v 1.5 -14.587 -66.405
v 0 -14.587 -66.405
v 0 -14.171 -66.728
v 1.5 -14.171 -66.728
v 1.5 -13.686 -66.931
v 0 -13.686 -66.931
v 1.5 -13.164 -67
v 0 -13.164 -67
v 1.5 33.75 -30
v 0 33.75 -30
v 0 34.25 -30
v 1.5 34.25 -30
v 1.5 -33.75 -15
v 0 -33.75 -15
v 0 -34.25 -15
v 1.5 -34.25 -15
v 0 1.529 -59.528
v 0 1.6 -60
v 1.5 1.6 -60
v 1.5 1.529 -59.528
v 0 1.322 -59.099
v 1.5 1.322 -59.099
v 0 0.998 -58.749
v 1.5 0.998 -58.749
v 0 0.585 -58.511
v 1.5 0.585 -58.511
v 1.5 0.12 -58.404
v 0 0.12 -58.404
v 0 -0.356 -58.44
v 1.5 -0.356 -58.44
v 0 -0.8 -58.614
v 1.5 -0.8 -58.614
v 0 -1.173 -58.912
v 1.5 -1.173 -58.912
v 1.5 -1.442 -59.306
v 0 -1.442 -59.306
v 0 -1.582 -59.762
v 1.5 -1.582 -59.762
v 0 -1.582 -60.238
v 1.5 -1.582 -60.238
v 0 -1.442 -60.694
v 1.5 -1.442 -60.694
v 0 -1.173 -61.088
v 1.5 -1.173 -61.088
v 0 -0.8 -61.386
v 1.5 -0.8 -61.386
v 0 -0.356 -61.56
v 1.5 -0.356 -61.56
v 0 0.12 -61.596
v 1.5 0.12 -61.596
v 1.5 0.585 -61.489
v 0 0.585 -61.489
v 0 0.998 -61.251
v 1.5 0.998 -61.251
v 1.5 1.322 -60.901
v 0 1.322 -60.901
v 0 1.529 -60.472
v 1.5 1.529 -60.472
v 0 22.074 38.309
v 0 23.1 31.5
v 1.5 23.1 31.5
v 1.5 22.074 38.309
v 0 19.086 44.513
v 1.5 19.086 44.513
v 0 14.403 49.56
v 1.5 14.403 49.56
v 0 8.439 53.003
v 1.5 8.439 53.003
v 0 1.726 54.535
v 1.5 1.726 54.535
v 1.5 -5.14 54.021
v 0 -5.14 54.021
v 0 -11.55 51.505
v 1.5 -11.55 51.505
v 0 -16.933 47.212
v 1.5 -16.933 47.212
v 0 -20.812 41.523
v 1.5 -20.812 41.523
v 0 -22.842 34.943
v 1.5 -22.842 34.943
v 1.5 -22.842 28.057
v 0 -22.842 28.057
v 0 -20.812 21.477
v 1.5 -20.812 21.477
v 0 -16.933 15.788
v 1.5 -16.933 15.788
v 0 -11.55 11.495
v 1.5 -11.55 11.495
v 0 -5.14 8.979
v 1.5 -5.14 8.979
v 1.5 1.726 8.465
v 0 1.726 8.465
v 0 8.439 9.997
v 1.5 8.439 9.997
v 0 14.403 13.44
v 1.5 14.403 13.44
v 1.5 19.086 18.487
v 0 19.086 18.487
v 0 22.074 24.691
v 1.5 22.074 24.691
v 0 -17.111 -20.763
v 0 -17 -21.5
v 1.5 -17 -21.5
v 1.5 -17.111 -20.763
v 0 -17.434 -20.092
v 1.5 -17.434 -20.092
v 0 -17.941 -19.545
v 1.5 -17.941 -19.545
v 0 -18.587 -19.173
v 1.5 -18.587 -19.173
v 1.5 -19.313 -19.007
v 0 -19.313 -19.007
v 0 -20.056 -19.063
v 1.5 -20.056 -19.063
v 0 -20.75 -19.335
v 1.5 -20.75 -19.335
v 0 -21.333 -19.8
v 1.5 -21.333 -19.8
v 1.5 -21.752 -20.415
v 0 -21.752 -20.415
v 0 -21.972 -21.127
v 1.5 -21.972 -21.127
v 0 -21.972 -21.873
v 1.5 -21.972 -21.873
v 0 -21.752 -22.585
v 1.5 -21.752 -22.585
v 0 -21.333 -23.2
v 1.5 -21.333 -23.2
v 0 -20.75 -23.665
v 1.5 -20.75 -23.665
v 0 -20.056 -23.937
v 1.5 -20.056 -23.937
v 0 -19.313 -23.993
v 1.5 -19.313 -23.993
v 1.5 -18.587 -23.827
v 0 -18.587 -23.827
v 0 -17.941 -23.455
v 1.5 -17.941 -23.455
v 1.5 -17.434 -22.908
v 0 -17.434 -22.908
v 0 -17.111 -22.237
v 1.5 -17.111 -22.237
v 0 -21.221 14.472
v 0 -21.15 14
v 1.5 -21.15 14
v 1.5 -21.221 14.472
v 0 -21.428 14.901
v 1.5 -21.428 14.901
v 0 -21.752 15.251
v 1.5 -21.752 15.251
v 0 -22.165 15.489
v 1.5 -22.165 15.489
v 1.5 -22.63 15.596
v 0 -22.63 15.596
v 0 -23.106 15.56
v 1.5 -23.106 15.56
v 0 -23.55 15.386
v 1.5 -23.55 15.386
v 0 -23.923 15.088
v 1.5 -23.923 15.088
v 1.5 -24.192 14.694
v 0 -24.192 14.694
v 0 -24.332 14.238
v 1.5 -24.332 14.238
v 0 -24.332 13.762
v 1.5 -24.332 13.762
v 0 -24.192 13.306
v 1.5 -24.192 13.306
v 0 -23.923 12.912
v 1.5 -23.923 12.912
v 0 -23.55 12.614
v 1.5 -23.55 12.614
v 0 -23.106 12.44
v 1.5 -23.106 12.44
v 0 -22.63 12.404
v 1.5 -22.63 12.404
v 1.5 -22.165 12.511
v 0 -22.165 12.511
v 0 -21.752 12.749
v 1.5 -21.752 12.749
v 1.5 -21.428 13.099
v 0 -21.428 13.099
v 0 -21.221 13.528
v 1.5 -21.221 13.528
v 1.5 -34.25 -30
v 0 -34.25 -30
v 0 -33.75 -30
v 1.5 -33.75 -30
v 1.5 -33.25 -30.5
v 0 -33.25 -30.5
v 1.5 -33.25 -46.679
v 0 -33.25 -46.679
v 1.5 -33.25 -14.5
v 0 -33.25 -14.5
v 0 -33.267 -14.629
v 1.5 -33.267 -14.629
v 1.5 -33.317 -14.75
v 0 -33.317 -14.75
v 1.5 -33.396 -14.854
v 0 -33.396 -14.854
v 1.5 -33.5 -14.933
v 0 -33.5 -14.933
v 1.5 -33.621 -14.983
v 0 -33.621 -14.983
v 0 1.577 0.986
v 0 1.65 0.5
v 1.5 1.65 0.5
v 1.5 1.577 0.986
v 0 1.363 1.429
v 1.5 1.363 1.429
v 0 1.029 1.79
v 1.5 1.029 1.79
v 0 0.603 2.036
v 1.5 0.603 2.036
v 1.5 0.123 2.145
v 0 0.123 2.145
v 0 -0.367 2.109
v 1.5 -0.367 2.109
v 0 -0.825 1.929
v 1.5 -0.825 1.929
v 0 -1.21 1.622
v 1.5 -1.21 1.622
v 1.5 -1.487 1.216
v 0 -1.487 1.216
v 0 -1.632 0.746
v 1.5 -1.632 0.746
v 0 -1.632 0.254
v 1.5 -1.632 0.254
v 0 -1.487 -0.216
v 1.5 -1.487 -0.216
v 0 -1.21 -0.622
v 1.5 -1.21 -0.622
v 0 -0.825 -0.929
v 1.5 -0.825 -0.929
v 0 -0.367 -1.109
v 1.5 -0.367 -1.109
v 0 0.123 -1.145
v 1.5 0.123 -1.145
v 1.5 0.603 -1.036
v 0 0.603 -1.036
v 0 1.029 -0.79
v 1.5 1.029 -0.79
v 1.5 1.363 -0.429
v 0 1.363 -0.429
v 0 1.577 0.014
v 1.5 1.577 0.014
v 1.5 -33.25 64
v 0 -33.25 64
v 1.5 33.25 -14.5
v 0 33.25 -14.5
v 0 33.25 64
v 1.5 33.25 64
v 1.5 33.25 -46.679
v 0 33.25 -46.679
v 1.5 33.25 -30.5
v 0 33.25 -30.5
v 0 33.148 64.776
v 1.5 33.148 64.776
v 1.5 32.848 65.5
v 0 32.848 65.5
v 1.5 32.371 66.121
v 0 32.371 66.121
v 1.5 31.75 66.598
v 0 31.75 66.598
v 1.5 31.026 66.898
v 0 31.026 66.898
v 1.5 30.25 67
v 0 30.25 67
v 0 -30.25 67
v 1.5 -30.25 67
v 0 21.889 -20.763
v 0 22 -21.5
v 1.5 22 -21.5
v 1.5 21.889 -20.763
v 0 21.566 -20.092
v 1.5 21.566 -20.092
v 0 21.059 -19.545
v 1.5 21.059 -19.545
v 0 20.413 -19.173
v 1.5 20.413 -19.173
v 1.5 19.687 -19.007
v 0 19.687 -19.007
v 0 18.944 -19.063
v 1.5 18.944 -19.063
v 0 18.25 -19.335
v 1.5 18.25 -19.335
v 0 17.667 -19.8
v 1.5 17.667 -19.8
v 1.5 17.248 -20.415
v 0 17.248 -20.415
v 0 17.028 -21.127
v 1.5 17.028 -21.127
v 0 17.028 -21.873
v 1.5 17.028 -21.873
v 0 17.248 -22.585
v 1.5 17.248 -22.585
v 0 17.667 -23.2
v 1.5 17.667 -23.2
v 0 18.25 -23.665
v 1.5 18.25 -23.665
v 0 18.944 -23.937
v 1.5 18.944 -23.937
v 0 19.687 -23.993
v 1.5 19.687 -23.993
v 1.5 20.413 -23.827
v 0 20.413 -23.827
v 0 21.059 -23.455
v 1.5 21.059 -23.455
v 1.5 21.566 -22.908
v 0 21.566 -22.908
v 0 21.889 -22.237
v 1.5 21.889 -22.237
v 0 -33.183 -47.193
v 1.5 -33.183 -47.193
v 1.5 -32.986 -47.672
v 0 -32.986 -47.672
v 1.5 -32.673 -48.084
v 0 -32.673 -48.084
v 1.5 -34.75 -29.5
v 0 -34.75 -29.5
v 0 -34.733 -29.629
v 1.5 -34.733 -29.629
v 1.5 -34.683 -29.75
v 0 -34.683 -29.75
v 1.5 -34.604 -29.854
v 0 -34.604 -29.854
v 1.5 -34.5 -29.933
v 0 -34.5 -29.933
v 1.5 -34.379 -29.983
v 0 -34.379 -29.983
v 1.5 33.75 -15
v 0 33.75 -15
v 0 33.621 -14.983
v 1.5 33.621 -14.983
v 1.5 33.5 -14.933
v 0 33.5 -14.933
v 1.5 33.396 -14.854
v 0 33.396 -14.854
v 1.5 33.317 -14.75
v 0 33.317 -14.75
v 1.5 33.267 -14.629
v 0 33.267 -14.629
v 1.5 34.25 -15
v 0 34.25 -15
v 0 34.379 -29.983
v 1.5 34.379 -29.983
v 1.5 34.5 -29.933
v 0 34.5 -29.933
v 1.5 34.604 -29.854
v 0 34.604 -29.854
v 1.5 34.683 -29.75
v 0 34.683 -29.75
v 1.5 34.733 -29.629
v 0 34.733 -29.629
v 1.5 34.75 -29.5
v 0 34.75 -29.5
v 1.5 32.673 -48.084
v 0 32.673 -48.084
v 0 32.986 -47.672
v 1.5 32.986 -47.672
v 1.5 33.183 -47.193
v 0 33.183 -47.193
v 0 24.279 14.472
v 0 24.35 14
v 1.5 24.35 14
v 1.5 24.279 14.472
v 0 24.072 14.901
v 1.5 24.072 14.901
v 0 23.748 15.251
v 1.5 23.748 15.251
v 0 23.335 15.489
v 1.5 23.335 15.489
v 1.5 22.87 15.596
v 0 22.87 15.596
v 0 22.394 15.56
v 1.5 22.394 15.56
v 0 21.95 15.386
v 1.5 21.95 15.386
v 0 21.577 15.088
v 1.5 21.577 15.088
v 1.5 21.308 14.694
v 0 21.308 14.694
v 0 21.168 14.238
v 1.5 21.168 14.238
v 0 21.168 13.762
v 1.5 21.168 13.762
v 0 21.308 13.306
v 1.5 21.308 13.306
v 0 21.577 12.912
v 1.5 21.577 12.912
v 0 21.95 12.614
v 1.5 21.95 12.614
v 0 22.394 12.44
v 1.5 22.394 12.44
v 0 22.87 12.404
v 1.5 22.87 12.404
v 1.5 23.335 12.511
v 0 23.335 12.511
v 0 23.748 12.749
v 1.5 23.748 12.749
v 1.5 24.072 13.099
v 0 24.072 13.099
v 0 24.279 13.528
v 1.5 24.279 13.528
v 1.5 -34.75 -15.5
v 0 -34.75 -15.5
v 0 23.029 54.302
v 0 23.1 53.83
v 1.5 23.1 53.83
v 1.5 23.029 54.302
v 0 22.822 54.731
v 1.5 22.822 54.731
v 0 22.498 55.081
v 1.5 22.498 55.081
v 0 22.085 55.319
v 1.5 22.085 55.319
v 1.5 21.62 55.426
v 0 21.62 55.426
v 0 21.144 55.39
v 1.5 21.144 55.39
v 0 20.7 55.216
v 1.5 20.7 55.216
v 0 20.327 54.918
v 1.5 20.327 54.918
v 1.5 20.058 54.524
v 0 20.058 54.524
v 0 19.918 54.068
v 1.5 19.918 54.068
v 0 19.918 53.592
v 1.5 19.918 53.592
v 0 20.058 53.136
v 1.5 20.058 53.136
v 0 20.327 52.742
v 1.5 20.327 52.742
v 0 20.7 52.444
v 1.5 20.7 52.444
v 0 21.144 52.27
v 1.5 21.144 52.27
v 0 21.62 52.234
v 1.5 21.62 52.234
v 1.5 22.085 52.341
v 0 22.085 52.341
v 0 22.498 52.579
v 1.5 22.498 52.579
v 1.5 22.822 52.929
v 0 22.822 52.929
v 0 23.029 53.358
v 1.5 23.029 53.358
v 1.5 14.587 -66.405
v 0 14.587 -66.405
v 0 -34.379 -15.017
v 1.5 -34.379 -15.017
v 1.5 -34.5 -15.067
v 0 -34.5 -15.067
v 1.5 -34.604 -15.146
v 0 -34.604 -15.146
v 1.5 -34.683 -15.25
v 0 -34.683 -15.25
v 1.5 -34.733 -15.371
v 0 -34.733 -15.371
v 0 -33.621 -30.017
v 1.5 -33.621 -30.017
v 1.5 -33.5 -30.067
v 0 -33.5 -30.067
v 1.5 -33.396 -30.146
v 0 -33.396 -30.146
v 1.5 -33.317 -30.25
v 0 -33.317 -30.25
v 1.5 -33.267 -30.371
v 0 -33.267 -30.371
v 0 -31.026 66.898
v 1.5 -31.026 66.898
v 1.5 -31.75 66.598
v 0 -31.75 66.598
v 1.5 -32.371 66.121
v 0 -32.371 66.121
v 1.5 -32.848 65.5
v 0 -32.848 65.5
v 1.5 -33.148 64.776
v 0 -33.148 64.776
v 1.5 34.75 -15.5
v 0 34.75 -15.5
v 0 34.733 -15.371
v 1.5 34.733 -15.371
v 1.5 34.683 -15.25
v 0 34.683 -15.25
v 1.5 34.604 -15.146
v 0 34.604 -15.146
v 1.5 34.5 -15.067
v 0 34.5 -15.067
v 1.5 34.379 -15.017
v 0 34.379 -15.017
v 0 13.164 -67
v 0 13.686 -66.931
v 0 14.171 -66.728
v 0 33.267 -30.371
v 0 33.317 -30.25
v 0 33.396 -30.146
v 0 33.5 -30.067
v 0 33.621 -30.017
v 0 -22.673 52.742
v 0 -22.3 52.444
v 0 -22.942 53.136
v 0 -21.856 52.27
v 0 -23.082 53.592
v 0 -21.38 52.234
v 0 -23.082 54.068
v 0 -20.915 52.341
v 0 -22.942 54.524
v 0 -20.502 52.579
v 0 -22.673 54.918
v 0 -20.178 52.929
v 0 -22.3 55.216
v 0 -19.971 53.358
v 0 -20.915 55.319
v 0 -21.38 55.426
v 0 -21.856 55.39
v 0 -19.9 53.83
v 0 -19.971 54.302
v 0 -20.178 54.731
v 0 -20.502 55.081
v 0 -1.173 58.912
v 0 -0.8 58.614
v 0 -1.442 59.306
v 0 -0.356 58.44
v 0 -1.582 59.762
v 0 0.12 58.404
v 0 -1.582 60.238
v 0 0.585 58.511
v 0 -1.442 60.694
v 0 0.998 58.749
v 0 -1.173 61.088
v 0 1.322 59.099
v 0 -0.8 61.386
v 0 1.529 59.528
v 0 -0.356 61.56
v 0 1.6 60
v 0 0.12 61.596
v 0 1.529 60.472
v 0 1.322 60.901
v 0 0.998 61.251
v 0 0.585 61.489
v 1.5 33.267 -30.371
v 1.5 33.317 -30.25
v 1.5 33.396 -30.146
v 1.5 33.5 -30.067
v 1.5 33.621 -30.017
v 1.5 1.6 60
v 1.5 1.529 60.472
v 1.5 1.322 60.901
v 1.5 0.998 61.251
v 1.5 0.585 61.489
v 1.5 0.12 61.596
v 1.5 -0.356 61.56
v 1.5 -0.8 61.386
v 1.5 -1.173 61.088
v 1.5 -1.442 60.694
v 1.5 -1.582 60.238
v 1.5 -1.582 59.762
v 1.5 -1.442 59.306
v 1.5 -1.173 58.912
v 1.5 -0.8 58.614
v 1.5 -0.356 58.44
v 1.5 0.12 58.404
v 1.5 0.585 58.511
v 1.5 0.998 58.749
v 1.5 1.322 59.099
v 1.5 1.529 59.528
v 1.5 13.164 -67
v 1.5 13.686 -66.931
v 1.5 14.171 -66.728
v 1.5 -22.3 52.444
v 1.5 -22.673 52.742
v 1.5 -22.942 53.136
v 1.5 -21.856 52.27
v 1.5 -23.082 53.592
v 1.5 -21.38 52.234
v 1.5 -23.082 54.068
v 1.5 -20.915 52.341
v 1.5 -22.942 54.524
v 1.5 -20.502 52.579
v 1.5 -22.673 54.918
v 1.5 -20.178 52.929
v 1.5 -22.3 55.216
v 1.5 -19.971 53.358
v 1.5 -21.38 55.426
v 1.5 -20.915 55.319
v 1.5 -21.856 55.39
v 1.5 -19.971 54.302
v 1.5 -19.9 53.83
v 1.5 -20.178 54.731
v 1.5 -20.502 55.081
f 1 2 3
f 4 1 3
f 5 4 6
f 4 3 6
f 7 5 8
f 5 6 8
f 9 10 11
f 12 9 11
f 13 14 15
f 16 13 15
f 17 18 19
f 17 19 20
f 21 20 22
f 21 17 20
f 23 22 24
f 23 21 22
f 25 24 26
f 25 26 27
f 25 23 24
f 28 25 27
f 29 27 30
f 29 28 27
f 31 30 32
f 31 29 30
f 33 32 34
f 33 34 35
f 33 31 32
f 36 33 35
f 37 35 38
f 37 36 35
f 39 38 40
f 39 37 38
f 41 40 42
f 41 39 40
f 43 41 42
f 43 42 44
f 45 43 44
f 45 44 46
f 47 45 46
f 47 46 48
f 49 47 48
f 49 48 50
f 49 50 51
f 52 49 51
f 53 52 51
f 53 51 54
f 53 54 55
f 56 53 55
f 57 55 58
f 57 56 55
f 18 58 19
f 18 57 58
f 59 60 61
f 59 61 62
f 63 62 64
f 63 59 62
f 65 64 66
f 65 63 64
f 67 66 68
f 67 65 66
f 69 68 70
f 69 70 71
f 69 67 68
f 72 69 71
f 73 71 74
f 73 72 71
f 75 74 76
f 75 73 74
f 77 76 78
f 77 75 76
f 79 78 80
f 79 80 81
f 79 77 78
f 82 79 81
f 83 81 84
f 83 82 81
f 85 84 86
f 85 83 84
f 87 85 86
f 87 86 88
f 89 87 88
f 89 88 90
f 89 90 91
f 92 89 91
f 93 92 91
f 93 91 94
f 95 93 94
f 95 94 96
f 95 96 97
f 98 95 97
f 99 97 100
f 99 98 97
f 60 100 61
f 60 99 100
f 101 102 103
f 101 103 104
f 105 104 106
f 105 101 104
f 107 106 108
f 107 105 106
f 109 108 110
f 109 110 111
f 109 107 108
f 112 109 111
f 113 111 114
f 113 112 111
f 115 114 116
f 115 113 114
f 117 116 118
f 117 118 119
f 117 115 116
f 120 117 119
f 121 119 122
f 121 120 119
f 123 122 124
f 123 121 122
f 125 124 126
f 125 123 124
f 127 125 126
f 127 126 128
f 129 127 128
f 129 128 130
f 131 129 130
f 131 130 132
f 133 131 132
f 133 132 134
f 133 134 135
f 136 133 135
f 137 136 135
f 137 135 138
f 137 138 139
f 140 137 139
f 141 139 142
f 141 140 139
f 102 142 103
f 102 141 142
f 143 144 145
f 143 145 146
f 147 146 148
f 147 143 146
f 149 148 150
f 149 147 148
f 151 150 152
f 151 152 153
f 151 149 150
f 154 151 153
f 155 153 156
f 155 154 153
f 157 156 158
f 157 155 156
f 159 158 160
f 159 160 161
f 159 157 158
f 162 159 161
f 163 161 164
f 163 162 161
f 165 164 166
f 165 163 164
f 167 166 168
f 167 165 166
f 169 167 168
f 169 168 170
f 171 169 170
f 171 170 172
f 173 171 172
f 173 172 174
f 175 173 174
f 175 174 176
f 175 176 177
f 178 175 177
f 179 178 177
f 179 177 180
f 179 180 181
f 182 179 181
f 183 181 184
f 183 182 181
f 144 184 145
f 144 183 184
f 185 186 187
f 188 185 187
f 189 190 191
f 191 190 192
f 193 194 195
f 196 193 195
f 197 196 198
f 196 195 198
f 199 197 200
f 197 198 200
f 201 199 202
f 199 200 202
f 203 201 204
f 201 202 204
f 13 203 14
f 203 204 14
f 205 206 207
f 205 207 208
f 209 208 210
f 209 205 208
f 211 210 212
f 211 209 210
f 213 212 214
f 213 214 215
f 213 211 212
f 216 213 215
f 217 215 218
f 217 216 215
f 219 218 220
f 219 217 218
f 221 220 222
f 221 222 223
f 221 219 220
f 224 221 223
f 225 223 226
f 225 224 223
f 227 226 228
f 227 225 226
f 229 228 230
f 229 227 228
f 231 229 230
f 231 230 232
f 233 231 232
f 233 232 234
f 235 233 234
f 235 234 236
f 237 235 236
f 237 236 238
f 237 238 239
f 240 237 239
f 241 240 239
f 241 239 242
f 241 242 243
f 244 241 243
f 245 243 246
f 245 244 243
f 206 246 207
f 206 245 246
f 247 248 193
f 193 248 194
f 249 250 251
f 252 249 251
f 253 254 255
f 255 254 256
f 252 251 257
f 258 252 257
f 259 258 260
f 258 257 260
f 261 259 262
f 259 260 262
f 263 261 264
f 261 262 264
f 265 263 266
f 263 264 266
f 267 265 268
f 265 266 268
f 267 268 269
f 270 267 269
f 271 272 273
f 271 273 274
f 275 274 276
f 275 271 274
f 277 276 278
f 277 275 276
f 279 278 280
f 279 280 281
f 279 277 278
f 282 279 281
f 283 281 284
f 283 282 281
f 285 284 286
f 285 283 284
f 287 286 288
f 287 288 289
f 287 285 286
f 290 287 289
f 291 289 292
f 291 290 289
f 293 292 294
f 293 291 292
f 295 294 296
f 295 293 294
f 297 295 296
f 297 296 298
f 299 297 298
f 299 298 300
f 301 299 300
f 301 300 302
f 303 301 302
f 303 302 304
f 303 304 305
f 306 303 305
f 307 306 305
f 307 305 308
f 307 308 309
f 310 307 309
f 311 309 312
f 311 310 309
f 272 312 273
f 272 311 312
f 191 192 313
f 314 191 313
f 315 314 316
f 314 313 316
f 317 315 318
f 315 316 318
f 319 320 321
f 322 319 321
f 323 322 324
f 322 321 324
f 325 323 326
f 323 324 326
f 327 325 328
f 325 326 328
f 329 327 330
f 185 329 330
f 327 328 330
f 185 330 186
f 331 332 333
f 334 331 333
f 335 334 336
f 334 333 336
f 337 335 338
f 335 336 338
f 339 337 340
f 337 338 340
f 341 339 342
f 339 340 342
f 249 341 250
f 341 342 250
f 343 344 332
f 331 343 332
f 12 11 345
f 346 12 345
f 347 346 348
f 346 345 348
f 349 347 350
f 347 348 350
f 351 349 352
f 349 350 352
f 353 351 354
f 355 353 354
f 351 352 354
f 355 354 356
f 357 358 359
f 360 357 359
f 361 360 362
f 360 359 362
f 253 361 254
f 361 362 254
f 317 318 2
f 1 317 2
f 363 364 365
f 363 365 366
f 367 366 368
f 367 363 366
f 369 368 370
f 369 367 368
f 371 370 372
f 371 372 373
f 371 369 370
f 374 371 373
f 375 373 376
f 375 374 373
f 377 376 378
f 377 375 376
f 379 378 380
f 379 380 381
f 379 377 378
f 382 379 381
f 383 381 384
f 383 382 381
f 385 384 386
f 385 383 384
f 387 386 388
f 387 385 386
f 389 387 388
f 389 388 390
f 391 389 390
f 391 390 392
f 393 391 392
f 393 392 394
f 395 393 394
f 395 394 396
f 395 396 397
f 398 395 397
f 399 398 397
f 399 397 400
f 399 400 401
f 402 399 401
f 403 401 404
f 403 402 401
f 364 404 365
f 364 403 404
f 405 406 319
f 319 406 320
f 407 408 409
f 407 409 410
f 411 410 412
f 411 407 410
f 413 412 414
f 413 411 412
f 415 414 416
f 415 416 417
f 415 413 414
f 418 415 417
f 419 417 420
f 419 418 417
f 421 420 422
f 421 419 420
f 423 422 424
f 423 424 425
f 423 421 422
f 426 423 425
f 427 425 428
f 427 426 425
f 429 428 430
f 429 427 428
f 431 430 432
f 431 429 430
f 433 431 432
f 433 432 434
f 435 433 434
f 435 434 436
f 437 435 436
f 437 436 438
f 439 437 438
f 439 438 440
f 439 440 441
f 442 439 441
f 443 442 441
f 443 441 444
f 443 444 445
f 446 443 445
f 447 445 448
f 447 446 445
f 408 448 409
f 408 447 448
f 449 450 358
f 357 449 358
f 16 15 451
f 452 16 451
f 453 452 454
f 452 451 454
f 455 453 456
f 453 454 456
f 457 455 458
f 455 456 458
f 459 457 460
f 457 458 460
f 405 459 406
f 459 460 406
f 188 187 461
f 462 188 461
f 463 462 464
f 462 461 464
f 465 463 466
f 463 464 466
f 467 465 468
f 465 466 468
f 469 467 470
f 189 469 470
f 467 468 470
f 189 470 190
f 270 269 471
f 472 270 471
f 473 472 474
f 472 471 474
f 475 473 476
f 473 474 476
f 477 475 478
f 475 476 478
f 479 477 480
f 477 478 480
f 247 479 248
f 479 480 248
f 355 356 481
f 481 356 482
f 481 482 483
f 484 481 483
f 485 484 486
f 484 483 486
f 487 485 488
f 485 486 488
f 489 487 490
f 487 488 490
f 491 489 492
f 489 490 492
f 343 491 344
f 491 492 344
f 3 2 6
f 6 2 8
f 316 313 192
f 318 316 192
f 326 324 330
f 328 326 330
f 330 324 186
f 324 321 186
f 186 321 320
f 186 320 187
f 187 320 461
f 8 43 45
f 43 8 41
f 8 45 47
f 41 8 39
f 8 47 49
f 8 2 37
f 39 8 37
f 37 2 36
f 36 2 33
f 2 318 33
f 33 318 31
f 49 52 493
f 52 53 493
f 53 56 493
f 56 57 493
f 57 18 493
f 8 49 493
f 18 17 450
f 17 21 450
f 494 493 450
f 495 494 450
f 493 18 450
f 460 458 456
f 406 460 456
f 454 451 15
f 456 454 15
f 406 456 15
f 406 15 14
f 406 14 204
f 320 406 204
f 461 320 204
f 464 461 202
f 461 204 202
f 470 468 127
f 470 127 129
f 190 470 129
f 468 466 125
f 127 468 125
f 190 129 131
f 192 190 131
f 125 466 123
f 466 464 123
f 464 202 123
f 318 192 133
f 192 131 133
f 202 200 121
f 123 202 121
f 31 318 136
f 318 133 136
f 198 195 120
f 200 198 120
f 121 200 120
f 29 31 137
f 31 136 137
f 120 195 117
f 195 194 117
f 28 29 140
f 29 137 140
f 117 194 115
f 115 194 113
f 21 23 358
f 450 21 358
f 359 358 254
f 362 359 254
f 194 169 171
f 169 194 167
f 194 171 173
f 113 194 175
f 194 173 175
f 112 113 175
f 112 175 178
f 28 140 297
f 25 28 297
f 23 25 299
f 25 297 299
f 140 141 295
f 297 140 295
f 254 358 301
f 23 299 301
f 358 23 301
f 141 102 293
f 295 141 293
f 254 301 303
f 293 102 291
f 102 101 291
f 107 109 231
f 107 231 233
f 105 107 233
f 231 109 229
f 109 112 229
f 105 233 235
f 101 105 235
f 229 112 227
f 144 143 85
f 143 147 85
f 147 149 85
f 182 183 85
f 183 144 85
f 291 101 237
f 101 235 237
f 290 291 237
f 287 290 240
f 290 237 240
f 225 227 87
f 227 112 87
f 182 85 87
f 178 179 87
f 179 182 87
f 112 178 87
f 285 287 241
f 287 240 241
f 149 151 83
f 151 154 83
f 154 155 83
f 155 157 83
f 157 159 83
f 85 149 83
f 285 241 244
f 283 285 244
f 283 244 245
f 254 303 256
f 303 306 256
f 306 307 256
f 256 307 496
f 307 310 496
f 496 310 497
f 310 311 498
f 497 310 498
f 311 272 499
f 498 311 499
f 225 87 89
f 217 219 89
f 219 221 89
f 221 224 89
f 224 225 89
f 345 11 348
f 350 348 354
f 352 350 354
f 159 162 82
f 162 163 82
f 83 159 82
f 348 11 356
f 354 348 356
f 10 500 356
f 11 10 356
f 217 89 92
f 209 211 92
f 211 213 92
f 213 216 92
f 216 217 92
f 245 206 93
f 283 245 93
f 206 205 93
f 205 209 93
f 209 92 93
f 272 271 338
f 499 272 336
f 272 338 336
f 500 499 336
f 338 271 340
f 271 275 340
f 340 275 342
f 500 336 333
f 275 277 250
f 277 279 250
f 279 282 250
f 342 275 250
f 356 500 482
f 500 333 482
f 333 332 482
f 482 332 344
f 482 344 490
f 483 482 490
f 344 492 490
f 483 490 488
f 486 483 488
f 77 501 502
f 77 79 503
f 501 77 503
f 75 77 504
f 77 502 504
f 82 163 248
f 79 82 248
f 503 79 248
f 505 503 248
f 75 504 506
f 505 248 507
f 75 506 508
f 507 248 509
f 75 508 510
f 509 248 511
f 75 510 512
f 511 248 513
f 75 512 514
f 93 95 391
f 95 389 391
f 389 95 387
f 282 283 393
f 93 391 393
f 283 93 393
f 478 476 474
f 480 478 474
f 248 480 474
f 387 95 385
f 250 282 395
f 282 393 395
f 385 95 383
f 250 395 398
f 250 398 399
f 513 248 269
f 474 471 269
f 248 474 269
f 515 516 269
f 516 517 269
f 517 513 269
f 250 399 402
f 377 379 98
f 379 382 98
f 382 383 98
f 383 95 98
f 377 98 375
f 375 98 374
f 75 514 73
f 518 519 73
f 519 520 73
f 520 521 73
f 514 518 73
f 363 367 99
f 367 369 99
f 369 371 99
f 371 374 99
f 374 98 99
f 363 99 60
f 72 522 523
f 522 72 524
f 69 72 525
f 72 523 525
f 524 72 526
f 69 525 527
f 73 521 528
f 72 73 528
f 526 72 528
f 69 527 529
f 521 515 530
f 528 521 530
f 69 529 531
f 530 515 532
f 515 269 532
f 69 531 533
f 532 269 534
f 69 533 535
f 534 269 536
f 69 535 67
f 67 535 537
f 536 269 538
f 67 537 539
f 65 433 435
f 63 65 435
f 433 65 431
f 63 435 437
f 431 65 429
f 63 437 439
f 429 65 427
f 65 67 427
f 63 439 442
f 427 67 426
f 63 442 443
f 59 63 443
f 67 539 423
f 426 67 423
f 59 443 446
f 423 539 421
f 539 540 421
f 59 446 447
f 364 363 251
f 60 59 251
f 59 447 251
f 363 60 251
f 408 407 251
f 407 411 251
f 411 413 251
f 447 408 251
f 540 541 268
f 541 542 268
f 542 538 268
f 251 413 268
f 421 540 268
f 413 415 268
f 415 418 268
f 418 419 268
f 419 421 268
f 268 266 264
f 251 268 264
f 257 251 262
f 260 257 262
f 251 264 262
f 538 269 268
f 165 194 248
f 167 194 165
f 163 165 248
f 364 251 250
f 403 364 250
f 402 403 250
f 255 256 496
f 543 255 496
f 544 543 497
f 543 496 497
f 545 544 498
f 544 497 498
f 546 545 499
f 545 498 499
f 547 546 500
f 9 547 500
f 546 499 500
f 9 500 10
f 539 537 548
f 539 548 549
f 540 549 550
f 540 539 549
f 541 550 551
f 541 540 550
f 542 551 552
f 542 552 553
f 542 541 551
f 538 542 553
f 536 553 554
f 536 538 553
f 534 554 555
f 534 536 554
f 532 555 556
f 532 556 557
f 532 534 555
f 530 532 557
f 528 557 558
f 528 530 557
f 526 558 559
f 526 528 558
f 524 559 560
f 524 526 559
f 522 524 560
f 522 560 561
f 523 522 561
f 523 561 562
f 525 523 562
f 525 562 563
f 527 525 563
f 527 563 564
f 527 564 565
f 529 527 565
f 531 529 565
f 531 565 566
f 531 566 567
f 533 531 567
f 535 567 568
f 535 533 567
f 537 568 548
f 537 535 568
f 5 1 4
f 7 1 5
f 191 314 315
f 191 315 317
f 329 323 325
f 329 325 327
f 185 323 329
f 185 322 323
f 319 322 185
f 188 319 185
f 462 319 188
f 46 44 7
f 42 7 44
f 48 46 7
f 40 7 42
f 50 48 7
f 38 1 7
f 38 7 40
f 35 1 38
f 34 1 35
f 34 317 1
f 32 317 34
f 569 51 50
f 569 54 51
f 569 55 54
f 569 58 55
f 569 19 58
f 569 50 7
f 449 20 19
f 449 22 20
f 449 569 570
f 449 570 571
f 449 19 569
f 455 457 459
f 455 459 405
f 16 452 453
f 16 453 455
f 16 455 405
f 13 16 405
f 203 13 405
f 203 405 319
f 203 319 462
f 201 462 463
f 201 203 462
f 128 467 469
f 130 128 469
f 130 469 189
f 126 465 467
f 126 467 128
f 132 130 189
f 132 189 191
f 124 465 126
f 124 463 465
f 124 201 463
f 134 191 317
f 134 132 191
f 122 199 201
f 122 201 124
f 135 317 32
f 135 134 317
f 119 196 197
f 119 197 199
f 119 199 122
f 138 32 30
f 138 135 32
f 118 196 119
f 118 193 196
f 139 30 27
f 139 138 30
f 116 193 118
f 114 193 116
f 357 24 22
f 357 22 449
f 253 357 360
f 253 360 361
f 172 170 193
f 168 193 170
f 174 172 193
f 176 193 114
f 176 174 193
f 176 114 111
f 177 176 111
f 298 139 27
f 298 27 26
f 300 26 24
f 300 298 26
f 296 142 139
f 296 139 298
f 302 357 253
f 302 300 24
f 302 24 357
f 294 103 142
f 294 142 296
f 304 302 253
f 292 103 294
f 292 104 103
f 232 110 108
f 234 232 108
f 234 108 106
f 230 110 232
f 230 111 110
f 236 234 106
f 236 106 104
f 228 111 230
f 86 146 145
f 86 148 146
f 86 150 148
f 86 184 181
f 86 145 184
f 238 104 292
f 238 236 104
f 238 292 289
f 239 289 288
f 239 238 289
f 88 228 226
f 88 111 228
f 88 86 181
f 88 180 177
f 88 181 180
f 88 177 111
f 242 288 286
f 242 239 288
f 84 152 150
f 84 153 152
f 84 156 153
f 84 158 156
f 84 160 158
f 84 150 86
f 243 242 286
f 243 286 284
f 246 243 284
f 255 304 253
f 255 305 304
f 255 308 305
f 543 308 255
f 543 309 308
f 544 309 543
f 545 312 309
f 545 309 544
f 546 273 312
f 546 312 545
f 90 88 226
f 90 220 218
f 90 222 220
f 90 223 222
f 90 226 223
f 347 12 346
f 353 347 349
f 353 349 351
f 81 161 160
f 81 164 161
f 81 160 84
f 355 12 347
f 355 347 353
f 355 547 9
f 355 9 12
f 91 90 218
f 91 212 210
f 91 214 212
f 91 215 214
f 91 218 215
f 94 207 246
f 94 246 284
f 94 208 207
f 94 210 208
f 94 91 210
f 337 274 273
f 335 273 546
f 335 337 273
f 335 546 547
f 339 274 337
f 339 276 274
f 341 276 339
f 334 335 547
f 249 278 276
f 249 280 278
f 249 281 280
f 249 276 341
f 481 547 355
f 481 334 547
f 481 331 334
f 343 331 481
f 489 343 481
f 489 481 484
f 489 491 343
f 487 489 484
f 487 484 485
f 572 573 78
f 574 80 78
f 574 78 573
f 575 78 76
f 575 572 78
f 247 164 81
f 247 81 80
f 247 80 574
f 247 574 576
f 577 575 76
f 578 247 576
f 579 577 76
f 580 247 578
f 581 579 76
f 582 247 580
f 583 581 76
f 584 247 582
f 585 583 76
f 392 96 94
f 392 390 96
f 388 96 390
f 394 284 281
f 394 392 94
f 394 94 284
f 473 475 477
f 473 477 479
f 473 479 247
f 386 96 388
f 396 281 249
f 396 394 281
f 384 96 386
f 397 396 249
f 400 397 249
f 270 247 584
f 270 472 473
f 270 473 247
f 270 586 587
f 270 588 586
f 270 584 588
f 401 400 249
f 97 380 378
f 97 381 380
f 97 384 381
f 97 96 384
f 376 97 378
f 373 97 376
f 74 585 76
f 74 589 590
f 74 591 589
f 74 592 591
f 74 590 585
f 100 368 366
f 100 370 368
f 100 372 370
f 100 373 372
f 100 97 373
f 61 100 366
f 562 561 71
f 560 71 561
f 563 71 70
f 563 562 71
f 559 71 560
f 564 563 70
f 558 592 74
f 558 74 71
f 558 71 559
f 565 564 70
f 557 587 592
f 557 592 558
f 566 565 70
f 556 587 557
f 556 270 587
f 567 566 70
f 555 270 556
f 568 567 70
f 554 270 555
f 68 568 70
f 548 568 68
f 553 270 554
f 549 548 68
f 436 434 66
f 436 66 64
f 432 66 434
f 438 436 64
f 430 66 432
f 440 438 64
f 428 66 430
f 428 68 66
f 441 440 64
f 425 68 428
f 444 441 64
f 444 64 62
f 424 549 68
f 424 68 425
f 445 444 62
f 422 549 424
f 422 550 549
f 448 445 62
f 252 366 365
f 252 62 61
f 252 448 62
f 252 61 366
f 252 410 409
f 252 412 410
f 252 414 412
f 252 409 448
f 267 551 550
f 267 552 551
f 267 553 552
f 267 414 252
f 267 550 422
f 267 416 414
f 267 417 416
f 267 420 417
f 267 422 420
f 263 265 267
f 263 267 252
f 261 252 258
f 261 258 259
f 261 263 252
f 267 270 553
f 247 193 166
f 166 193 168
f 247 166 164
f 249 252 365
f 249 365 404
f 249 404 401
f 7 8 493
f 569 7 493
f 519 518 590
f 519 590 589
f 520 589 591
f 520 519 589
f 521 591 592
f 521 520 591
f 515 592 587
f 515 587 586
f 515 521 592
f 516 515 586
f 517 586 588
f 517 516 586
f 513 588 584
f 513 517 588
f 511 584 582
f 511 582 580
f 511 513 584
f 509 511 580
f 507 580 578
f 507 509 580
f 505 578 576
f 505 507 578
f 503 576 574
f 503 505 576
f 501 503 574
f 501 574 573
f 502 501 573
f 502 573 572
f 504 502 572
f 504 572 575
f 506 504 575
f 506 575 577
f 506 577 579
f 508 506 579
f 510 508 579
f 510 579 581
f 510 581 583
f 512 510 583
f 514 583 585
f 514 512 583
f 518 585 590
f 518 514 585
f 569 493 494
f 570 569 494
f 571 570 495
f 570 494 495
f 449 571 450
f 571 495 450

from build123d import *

# Parameters (mm, degrees)
F0_R     = 2.5
F0_R_2   = 1.6
F0_R_3   = 1.65
F0_R_4   = 23.1
F1_DEPTH = 1.5


with BuildPart() as f1:
    # F0 (on Right) → F1 (new body)
    with BuildSketch(Plane.YZ):
        with BuildLine():
            ThreePointArc((33.25, 64), (32.37132, 66.12132), (30.25, 67))
            Line((30.25, 67), (-30.25, 67))
            ThreePointArc((-30.25, 67), (-32.37132, 66.12132), (-33.25, 64))
            Line((-33.25, 64), (-33.25, -14.5))
            ThreePointArc((-33.25, -14.5), (-33.396447, -14.853553), (-33.75, -15))
            Line((-33.75, -15), (-34.25, -15))
            ThreePointArc((-34.25, -15), (-34.603553, -15.146447), (-34.75, -15.5))
            Line((-34.75, -15.5), (-34.75, -29.5))
            ThreePointArc((-34.75, -29.5), (-34.603553, -29.853553), (-34.25, -30))
            Line((-34.25, -30), (-33.75, -30))
            ThreePointArc((-33.75, -30), (-33.396447, -30.146447), (-33.25, -30.5))
            Line((-33.25, -30.5), (-33.25, -46.679121))
            ThreePointArc((-33.25, -46.679121), (-33.100218, -47.438524), (-32.673308, -48.084182))
            Line((-32.673308, -48.084182), (-14.587312, -66.40506))
            ThreePointArc((-14.587312, -66.40506), (-13.935328, -66.845281), (-13.164004, -67))
            Line((-13.164004, -67), (13.164004, -67))
            ThreePointArc((13.164004, -67), (13.935328, -66.845281), (14.587312, -66.40506))
            Line((14.587312, -66.40506), (32.673308, -48.084182))
            ThreePointArc((32.673308, -48.084182), (33.100218, -47.438524), (33.25, -46.679121))
            Line((33.25, -46.679121), (33.25, -30.5))
            ThreePointArc((33.25, -30.5), (33.396447, -30.146447), (33.75, -30))
            Line((33.75, -30), (34.25, -30))
            ThreePointArc((34.25, -30), (34.603553, -29.853553), (34.75, -29.5))
            Line((34.75, -29.5), (34.75, -15.5))
            ThreePointArc((34.75, -15.5), (34.603553, -15.146447), (34.25, -15))
            Line((34.25, -15), (33.75, -15))
            ThreePointArc((33.75, -15), (33.396447, -14.853553), (33.25, -14.5))
            Line((33.25, -14.5), (33.25, 64))
        make_face()
        with Locations((-19.5, -21.5)):
            Circle(F0_R, mode=Mode.SUBTRACT)
        with Locations((0, -60)):
            Circle(F0_R_2, mode=Mode.SUBTRACT)
        with Locations((19.5, -21.5)):
            Circle(F0_R, mode=Mode.SUBTRACT)
        with Locations((-22.75, 14)):
            Circle(F0_R_2, mode=Mode.SUBTRACT)
        with Locations((-21.5, 53.83)):
            Circle(F0_R_2, mode=Mode.SUBTRACT)
        with Locations((0, 0.5)):
            Circle(F0_R_3, mode=Mode.SUBTRACT)
        with Locations((0, 31.5)):
            Circle(F0_R_4, mode=Mode.SUBTRACT)
        with Locations((22.75, 14)):
            Circle(F0_R_2, mode=Mode.SUBTRACT)
        with Locations((0, 60)):
            Circle(F0_R_2, mode=Mode.SUBTRACT)
        with Locations((21.5, 53.83)):
            Circle(F0_R_2, mode=Mode.SUBTRACT)
    extrude(amount=F1_DEPTH)


solid = f1.part
